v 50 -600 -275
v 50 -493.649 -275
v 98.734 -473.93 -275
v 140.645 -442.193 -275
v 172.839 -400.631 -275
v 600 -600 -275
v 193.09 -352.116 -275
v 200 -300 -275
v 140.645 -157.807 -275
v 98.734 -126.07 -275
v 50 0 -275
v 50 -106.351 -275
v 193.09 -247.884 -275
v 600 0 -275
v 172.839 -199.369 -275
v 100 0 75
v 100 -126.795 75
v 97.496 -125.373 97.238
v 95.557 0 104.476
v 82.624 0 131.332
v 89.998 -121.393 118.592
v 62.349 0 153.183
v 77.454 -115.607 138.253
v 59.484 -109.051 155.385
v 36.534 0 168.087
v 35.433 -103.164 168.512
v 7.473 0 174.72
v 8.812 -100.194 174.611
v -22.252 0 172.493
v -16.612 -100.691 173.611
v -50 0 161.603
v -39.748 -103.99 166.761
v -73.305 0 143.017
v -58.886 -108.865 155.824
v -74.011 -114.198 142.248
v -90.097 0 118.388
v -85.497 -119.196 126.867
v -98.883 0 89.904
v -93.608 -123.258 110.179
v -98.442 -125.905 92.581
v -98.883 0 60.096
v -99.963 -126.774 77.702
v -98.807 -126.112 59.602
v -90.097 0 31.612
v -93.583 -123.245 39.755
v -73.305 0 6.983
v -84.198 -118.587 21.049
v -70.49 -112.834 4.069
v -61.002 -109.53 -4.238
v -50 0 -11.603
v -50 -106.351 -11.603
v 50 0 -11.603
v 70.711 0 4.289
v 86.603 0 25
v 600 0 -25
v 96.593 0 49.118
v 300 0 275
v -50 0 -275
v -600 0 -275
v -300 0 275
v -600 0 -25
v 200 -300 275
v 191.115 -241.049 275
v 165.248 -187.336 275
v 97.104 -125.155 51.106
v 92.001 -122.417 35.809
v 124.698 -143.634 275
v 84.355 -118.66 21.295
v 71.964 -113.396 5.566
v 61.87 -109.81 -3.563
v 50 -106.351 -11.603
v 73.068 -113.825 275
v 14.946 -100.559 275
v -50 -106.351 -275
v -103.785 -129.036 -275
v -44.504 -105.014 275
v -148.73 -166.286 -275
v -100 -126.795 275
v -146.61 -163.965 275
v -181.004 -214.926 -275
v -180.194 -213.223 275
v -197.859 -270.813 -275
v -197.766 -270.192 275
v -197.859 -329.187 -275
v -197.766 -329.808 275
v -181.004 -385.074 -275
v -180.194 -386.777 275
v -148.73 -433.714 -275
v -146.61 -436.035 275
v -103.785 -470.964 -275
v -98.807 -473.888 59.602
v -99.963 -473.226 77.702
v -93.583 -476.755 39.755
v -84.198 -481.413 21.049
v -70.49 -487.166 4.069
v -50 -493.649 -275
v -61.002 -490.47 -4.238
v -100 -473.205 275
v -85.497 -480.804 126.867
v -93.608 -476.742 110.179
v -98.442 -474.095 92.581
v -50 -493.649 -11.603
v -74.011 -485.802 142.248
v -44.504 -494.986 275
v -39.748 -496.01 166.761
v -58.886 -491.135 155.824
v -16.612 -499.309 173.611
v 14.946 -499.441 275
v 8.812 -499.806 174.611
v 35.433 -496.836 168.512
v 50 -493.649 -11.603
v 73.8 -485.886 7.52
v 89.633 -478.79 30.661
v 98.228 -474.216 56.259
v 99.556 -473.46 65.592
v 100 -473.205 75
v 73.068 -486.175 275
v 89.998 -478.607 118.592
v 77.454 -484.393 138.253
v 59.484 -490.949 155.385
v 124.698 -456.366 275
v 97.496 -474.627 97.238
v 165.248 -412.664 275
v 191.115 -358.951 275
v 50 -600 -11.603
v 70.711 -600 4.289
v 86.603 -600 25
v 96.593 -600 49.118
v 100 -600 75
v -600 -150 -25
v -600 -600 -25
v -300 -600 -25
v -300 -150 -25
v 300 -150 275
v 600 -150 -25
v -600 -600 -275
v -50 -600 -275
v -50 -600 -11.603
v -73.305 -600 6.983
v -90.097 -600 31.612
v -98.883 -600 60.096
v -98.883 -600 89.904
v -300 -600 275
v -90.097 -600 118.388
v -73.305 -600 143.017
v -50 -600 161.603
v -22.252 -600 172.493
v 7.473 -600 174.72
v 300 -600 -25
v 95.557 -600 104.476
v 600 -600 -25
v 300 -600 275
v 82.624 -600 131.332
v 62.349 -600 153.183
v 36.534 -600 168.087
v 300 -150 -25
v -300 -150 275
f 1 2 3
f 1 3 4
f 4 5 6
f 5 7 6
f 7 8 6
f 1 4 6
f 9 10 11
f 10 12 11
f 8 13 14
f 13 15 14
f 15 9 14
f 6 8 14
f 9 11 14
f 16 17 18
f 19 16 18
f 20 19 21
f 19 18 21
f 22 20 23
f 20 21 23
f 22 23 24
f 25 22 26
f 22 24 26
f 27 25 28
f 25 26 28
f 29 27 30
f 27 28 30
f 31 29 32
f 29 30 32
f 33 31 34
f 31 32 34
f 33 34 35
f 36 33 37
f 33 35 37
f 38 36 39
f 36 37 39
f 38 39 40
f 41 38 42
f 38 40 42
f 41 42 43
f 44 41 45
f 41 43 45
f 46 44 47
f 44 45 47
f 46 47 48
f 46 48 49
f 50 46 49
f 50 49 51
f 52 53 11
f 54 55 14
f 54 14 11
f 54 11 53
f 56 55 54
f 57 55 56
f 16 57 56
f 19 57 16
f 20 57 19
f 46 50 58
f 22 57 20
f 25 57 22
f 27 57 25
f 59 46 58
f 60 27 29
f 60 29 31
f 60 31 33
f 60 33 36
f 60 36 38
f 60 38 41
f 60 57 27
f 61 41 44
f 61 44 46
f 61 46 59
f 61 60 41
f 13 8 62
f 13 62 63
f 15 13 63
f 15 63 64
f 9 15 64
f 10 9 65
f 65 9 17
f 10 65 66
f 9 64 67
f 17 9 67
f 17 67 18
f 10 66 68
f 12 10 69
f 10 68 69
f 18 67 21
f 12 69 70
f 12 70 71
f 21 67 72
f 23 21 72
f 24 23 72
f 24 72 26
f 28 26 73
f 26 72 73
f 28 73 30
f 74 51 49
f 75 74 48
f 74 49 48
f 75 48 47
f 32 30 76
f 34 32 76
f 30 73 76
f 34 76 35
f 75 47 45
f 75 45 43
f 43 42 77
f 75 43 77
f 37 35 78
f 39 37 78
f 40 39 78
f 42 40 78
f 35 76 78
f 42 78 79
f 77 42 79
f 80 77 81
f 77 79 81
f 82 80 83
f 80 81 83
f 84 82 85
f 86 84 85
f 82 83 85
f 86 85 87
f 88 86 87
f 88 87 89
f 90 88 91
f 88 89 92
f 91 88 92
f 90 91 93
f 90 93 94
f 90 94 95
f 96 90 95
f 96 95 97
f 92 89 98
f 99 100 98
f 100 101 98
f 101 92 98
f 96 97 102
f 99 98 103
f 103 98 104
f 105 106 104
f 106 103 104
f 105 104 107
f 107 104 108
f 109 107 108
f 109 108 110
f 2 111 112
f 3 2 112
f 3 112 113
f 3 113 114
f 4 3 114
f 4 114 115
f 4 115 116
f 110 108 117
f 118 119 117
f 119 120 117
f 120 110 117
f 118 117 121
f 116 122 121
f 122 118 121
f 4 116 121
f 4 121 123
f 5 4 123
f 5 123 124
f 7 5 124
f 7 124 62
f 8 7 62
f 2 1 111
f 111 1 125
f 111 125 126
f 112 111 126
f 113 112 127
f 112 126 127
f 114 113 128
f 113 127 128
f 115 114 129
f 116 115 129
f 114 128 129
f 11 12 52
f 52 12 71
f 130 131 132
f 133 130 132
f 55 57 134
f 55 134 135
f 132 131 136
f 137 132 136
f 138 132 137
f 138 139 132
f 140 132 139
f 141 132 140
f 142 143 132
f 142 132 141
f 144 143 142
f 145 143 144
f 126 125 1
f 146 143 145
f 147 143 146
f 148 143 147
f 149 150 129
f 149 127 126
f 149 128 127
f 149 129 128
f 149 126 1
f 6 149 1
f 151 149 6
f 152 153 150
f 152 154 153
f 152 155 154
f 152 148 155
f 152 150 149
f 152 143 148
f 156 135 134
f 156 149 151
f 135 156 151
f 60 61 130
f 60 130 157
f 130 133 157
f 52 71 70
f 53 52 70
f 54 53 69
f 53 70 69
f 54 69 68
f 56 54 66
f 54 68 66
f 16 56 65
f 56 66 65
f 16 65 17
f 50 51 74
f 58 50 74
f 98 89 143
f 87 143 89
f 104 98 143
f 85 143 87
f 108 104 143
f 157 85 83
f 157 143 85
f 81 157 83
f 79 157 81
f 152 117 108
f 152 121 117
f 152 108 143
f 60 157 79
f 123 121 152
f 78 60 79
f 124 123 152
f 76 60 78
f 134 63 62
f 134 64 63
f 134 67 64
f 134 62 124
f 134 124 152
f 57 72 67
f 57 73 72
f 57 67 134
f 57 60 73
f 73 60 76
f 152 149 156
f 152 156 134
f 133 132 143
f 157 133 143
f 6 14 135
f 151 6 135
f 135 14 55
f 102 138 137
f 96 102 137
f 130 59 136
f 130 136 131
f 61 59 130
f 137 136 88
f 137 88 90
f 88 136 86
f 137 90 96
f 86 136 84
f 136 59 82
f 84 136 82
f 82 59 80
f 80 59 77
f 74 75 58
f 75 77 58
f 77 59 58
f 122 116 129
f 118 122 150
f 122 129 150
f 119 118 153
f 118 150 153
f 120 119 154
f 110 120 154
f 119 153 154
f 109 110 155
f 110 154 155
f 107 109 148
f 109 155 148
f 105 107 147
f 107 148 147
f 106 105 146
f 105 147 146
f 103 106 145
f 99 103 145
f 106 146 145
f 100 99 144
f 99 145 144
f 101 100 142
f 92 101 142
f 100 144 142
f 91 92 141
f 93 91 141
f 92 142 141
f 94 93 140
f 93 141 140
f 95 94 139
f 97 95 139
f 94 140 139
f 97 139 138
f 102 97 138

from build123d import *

# Parameters (mm, degrees)
F0_W     = 1200
F0_H     = 550
F1_DEPTH = 600
F2_W     = 300
F2_H     = 300
F3_DEPTH = 600.001
F5_DEPTH = 150
F6_R     = 200
F7_DEPTH = 550.001
F9_DEPTH = 600.001


with BuildPart() as f1:
    # F0 (on Front) → F1 (new body)
    with BuildSketch(Plane.XZ):
        Rectangle(F0_W, F0_H)
    extrude(amount=F1_DEPTH)

    # F2 (on face) → F3 (cut, through all)
    with BuildSketch(Plane.XZ.offset(600)):
        with Locations((-450, 125)):
            Rectangle(F2_W, F2_H)
        with Locations((450, 125)):
            Rectangle(F2_W, F2_H)
    extrude(amount=-F3_DEPTH, mode=Mode.SUBTRACT)

    # F4 (on face) → F5 (join)
    with BuildSketch(Plane(origin=(0, 0, 0), x_dir=(-1, 0, 0), z_dir=(0, 1, 0))):
        Polygon((-300, -25), (-300, 275), (-600, -25), align=None)
        Polygon((600, -25), (300, 275), (300, -25), align=None)
    extrude(amount=-F5_DEPTH)

    # F6 (on face) → F7 (cut, through all)
    with BuildSketch(Plane.XY.offset(275)):
        with Locations((0, -300)):
            Circle(F6_R)
    extrude(amount=-F7_DEPTH, mode=Mode.SUBTRACT)

    # F8 (on face) → F9 (cut, through all)
    with BuildSketch(Plane.XZ.offset(600)):
        with BuildLine():
            ThreePointArc((50, -11.6025403784), (86.6025403784, 25), (100, 75))
            ThreePointArc((100, 75), (-50, 161.6025403784), (-50, -11.6025403784))
            Line((-50, -11.6025403784), (-50, 75))
            Line((-50, 75), (50, 75))
            Line((50, 75), (50, -11.6025403784))
        make_face()
        with BuildLine():
            Line((-50, 75), (-50, -11.6025403784))
            ThreePointArc((-50, -11.6025403784), (0, -25), (50, -11.6025403784))
            Line((50, -11.6025403784), (50, 75))
            Line((50, 75), (-50, 75))
        make_face()
        with BuildLine():
            ThreePointArc((50, -11.6025403784), (0, -25), (-50, -11.6025403784))
            Line((-50, -11.6025403784), (-50, -625))
            Line((-50, -625), (50, -625))
            Line((50, -625), (50, -11.6025403784))
        make_face()
    extrude(amount=-F9_DEPTH, mode=Mode.SUBTRACT)


solid = f1.part
